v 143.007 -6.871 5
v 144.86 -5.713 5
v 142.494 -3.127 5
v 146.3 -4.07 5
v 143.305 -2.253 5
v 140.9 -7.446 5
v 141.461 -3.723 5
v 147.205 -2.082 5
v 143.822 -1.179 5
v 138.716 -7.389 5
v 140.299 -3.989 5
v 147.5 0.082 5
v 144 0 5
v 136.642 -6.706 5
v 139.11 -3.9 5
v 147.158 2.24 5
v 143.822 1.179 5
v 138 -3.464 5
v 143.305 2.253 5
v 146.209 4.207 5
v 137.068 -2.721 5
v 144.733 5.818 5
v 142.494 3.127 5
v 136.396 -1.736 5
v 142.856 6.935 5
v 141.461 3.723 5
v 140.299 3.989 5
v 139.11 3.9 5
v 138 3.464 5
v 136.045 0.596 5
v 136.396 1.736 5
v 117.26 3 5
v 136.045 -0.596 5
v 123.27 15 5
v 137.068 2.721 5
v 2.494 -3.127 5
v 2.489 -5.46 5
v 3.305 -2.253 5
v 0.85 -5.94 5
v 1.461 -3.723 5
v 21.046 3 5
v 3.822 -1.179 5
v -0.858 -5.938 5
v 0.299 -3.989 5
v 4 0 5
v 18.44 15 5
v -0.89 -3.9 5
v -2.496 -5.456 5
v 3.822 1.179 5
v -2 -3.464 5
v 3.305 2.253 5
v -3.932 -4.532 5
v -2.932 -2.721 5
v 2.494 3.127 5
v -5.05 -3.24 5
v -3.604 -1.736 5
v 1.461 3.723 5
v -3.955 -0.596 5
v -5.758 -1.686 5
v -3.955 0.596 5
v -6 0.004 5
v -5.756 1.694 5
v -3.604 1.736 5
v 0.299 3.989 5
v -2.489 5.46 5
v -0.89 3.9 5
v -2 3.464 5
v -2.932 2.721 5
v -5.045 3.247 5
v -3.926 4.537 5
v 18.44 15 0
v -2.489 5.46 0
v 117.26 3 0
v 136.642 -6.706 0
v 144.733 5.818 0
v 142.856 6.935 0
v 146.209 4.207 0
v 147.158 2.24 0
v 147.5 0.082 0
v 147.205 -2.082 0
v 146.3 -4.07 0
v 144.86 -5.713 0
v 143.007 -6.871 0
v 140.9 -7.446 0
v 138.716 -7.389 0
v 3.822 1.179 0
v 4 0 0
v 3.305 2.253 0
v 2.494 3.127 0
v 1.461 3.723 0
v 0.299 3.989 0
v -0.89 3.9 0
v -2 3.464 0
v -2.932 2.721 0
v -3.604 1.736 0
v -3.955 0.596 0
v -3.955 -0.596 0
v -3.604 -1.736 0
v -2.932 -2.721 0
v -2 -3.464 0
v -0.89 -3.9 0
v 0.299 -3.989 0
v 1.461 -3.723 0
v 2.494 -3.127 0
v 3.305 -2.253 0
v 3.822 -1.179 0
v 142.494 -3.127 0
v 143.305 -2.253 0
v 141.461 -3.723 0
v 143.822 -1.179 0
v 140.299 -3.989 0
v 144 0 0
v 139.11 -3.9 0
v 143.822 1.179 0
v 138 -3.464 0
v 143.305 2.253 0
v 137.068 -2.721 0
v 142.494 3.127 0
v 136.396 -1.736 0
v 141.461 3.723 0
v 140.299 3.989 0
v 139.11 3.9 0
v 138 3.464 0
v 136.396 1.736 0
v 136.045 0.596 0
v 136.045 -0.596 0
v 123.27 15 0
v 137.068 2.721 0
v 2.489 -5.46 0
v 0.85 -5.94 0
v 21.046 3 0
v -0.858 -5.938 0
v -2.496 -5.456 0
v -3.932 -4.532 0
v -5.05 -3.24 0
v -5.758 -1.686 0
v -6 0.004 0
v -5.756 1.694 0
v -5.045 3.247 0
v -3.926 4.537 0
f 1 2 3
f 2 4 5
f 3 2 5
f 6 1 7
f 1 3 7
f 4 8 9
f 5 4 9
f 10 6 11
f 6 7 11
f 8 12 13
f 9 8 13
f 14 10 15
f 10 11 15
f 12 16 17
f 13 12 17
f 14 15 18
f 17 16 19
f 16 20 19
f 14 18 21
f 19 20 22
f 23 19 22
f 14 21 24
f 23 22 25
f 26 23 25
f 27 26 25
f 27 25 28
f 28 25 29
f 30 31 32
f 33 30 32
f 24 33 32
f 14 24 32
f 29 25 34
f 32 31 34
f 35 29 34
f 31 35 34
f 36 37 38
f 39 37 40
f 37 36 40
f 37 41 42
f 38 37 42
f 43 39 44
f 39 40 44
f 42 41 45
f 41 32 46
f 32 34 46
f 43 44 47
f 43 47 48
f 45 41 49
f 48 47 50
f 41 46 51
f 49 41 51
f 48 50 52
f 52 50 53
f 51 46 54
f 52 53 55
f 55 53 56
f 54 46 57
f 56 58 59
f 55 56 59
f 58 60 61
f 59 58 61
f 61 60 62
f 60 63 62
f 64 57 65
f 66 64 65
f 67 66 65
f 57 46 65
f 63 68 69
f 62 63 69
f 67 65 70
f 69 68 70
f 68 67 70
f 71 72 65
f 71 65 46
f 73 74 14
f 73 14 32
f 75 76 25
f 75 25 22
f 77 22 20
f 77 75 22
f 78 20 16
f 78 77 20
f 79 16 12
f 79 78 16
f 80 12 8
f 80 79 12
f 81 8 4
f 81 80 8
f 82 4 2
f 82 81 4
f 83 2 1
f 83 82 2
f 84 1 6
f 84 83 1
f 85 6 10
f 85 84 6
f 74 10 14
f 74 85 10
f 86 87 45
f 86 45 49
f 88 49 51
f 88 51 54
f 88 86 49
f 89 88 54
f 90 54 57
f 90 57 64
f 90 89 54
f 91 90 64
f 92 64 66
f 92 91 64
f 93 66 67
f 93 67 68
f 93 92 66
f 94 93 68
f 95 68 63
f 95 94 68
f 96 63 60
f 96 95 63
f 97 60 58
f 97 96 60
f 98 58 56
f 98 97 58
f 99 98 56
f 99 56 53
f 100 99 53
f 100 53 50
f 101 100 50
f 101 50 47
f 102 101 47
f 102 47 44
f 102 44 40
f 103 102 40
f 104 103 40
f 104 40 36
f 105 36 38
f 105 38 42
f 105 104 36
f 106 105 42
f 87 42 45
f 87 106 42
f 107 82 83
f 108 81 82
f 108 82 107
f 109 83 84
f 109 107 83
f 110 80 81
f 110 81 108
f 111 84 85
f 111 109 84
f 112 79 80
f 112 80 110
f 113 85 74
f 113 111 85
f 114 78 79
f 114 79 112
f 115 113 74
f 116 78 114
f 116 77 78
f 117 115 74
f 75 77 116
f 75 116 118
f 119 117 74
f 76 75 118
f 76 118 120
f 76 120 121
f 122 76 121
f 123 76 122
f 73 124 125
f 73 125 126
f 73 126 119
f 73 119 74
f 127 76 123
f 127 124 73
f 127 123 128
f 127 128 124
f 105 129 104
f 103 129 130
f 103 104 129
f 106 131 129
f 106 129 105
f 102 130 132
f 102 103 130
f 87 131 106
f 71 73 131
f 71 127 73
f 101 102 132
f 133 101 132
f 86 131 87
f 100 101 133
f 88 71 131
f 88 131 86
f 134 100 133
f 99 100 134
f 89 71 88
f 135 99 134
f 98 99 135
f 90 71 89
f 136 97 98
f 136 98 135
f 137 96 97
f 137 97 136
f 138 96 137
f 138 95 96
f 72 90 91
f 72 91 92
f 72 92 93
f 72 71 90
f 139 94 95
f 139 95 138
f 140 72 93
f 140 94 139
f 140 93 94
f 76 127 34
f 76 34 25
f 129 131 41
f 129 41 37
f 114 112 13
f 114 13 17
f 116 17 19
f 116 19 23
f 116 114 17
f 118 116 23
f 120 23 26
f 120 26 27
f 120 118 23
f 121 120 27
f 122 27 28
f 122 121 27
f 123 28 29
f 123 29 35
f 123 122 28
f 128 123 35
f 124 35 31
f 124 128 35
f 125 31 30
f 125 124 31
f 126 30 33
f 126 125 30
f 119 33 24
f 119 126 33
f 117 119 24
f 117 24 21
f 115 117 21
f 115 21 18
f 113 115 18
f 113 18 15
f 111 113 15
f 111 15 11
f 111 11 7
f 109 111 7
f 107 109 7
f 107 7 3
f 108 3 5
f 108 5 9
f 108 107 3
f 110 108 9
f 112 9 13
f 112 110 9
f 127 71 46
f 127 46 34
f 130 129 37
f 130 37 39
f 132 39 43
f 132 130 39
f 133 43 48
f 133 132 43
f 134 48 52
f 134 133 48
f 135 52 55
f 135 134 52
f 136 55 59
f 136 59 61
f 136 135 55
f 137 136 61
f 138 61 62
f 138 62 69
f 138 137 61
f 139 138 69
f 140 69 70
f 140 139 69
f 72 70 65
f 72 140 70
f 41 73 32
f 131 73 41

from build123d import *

# Parameters (mm, degrees)
SCHIZZO1_R                   = 4
ESTRUSIONE_ESTRUSIONE1_DEPTH = 5


with BuildPart() as part:
    # Schizzo1 → Estrusione-Estrusione1 (new body)
    with BuildSketch(Plane.XY):
        with BuildLine():
            Line((18.440051647, 15), (123.269745712, 15))
            Line((123.269745712, 15), (142.855666239, 6.935068156))
            ThreePointArc((142.855666239, 6.935068156), (146.82520143, -3.10911972), (136.641644665, -6.706075562))
            Line((136.641644665, -6.706075562), (117.260230363, 3))
            Line((117.260230363, 3), (21.046177465, 3))
            Line((21.046177465, 3), (2.488742023, -5.459502096))
            ThreePointArc((2.488742023, -5.459502096), (-5.459502096, -2.488742023), (-2.488742023, 5.459502096))
            Line((-2.488742023, 5.459502096), (18.440051647, 15))
        make_face()
        Circle(SCHIZZO1_R, mode=Mode.SUBTRACT)
        with Locations((140, 0)):
            Circle(SCHIZZO1_R, mode=Mode.SUBTRACT)
    extrude(amount=ESTRUSIONE_ESTRUSIONE1_DEPTH)


solid = part.part
